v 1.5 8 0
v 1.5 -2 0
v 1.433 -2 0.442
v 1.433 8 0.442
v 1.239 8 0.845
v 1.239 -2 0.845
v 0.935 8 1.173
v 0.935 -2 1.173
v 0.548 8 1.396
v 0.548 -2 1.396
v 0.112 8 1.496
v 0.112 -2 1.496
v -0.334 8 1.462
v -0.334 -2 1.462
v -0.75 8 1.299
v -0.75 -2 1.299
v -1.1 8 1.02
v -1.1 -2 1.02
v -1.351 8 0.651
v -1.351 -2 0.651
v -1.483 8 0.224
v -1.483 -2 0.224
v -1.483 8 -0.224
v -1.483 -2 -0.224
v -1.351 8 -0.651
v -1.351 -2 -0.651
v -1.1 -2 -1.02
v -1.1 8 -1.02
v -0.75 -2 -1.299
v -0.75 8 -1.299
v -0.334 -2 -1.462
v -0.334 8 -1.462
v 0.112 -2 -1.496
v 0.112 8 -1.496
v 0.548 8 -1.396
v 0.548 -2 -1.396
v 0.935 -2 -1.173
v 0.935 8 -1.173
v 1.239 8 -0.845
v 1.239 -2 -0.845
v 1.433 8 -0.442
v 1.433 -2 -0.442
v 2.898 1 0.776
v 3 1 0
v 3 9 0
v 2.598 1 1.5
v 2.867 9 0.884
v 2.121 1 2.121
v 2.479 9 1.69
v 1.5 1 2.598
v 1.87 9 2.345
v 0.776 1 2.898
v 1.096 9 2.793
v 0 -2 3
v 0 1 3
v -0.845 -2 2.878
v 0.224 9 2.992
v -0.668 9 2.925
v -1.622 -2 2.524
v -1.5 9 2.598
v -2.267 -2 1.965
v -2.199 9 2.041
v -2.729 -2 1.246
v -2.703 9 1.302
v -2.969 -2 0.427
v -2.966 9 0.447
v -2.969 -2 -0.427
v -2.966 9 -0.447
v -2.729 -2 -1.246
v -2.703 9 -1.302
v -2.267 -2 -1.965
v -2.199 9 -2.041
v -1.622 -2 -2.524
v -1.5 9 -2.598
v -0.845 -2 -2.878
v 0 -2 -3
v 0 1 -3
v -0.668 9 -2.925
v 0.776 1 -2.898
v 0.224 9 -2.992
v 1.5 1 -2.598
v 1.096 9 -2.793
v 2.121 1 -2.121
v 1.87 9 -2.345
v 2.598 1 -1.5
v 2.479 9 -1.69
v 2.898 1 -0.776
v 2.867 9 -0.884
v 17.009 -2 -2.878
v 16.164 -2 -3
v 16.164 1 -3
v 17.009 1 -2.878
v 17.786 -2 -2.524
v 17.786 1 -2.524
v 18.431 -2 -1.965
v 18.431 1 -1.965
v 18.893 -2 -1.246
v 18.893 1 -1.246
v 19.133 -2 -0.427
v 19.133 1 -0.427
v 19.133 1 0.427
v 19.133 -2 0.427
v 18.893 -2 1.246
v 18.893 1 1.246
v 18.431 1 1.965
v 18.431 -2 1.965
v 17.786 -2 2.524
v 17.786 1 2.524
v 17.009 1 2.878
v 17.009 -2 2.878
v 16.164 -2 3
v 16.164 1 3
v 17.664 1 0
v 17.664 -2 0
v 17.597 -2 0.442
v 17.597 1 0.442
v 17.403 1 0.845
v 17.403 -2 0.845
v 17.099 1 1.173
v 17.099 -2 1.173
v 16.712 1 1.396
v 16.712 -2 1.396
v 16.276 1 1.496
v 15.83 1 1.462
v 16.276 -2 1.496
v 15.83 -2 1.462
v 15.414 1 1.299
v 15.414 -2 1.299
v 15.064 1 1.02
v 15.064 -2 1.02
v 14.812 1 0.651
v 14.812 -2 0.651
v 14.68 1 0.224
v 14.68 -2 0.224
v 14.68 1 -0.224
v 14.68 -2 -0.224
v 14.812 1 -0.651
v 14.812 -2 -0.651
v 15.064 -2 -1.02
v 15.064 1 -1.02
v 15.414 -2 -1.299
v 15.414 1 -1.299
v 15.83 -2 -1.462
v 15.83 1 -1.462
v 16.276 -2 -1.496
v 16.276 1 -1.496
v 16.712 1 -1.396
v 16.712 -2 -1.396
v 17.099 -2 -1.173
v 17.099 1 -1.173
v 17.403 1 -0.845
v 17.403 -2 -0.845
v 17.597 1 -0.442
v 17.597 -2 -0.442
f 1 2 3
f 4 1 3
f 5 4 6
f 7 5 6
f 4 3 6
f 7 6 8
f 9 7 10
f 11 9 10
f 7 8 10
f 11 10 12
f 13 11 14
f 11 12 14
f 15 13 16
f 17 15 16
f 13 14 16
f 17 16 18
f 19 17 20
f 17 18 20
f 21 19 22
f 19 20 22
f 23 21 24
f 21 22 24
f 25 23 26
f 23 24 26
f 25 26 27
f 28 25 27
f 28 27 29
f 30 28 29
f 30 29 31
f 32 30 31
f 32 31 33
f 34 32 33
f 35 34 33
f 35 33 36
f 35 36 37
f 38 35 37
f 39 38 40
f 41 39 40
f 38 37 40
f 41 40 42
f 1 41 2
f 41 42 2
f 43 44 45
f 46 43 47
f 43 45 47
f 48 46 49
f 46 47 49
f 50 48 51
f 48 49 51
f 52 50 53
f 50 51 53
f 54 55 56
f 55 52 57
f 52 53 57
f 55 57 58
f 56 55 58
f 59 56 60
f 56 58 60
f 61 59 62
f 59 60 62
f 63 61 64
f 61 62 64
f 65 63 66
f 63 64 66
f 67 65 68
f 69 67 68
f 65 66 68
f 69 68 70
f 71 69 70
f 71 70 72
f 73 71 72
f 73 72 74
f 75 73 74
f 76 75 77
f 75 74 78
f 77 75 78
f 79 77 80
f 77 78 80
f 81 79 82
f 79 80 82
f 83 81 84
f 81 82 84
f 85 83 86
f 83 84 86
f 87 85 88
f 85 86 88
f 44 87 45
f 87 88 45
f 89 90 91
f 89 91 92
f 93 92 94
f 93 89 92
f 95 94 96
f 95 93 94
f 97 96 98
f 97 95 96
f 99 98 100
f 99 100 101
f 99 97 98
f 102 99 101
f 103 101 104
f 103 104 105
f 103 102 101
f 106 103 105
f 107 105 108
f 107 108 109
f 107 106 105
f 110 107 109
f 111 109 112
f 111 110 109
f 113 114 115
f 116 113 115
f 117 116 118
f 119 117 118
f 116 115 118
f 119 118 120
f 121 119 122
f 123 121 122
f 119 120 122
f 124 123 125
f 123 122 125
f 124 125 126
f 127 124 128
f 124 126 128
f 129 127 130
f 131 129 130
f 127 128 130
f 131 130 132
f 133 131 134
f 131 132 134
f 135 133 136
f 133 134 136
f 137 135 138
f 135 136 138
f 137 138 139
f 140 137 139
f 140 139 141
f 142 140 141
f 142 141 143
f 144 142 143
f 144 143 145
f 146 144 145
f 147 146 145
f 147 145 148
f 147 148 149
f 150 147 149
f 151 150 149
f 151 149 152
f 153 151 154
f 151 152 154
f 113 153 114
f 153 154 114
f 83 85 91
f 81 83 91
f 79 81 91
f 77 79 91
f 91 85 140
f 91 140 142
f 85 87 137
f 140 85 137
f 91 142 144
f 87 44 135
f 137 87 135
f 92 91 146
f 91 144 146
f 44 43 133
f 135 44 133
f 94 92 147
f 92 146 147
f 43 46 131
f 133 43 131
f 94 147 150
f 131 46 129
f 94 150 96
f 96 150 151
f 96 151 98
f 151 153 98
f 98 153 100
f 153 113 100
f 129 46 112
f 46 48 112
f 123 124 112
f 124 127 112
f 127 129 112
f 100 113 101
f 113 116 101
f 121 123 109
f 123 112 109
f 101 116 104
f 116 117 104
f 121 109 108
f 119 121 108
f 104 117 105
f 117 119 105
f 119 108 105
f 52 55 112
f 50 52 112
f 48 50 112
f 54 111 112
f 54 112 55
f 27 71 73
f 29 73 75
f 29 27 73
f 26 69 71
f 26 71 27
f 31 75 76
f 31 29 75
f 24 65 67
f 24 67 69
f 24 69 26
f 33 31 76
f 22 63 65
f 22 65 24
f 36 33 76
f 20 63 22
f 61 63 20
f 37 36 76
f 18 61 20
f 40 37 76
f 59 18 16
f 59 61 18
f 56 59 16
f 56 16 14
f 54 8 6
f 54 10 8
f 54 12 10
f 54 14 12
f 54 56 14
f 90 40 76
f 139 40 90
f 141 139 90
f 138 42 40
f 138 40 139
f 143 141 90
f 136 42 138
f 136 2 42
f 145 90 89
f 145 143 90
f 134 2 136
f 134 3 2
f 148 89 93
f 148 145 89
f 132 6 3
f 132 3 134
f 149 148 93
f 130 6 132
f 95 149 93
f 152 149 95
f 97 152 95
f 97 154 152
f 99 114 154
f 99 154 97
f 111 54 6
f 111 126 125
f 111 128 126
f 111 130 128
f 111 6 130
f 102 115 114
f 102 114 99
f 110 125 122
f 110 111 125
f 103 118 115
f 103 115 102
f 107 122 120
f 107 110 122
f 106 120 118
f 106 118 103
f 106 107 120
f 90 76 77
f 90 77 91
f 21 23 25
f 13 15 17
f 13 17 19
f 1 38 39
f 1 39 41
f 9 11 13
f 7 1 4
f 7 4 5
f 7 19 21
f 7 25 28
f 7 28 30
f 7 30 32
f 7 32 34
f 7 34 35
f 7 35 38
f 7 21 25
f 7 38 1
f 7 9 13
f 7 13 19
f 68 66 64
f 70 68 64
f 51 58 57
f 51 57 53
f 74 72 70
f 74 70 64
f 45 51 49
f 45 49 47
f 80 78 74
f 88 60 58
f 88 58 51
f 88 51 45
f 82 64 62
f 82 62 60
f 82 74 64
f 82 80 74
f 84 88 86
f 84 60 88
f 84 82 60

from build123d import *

# Parameters (mm, degrees)
SKETCH1_R           = 3
BOSS_EXTRUDE1_DEPTH = 9
SKETCH4_R           = 3
BOSS_EXTRUDE3_DEPTH = 2
SKETCH6_R           = 1.5
BOSS_EXTRUDE4_DEPTH = 3
SKETCH7_R           = 1.5
CUT_EXTRUDE3_DEPTH  = 10


with BuildPart() as part:
    # Sketch1 → Boss-Extrude1 (new body)
    with BuildSketch(Plane(origin=(0, 0, 0), x_dir=(1, 0, 0), z_dir=(0, 1, 0))):
        Circle(SKETCH1_R)
    extrude(amount=BOSS_EXTRUDE1_DEPTH)

    # Sketch4 → Boss-Extrude3 (add)
    with BuildSketch(Plane.XZ):
        Circle(SKETCH4_R)
    extrude(amount=BOSS_EXTRUDE3_DEPTH)

    # Sketch6 → Boss-Extrude4 (add)
    with BuildSketch(Plane.XZ.offset(2)):
        with BuildLine():
            Line((16.163723902, 3), (0, 3))
            ThreePointArc((0, 3), (2.121320344, 2.121320344), (3, 0))
            ThreePointArc((3, 0), (2.121320344, -2.121320344), (0, -3))
            Line((0, -3), (16.163723902, -3))
            ThreePointArc((16.163723902, -3), (19.163723902, 0), (16.163723902, 3))
        make_face()
        with Locations((16.163723902, 0)):
            Circle(SKETCH6_R, mode=Mode.SUBTRACT)
    extrude(amount=-BOSS_EXTRUDE4_DEPTH)

    # Sketch7 → Cut-Extrude3 (cut)
    with BuildSketch(Plane.XZ.offset(2)):
        Circle(SKETCH7_R)
    extrude(amount=-CUT_EXTRUDE3_DEPTH, mode=Mode.SUBTRACT)


solid = part.part
